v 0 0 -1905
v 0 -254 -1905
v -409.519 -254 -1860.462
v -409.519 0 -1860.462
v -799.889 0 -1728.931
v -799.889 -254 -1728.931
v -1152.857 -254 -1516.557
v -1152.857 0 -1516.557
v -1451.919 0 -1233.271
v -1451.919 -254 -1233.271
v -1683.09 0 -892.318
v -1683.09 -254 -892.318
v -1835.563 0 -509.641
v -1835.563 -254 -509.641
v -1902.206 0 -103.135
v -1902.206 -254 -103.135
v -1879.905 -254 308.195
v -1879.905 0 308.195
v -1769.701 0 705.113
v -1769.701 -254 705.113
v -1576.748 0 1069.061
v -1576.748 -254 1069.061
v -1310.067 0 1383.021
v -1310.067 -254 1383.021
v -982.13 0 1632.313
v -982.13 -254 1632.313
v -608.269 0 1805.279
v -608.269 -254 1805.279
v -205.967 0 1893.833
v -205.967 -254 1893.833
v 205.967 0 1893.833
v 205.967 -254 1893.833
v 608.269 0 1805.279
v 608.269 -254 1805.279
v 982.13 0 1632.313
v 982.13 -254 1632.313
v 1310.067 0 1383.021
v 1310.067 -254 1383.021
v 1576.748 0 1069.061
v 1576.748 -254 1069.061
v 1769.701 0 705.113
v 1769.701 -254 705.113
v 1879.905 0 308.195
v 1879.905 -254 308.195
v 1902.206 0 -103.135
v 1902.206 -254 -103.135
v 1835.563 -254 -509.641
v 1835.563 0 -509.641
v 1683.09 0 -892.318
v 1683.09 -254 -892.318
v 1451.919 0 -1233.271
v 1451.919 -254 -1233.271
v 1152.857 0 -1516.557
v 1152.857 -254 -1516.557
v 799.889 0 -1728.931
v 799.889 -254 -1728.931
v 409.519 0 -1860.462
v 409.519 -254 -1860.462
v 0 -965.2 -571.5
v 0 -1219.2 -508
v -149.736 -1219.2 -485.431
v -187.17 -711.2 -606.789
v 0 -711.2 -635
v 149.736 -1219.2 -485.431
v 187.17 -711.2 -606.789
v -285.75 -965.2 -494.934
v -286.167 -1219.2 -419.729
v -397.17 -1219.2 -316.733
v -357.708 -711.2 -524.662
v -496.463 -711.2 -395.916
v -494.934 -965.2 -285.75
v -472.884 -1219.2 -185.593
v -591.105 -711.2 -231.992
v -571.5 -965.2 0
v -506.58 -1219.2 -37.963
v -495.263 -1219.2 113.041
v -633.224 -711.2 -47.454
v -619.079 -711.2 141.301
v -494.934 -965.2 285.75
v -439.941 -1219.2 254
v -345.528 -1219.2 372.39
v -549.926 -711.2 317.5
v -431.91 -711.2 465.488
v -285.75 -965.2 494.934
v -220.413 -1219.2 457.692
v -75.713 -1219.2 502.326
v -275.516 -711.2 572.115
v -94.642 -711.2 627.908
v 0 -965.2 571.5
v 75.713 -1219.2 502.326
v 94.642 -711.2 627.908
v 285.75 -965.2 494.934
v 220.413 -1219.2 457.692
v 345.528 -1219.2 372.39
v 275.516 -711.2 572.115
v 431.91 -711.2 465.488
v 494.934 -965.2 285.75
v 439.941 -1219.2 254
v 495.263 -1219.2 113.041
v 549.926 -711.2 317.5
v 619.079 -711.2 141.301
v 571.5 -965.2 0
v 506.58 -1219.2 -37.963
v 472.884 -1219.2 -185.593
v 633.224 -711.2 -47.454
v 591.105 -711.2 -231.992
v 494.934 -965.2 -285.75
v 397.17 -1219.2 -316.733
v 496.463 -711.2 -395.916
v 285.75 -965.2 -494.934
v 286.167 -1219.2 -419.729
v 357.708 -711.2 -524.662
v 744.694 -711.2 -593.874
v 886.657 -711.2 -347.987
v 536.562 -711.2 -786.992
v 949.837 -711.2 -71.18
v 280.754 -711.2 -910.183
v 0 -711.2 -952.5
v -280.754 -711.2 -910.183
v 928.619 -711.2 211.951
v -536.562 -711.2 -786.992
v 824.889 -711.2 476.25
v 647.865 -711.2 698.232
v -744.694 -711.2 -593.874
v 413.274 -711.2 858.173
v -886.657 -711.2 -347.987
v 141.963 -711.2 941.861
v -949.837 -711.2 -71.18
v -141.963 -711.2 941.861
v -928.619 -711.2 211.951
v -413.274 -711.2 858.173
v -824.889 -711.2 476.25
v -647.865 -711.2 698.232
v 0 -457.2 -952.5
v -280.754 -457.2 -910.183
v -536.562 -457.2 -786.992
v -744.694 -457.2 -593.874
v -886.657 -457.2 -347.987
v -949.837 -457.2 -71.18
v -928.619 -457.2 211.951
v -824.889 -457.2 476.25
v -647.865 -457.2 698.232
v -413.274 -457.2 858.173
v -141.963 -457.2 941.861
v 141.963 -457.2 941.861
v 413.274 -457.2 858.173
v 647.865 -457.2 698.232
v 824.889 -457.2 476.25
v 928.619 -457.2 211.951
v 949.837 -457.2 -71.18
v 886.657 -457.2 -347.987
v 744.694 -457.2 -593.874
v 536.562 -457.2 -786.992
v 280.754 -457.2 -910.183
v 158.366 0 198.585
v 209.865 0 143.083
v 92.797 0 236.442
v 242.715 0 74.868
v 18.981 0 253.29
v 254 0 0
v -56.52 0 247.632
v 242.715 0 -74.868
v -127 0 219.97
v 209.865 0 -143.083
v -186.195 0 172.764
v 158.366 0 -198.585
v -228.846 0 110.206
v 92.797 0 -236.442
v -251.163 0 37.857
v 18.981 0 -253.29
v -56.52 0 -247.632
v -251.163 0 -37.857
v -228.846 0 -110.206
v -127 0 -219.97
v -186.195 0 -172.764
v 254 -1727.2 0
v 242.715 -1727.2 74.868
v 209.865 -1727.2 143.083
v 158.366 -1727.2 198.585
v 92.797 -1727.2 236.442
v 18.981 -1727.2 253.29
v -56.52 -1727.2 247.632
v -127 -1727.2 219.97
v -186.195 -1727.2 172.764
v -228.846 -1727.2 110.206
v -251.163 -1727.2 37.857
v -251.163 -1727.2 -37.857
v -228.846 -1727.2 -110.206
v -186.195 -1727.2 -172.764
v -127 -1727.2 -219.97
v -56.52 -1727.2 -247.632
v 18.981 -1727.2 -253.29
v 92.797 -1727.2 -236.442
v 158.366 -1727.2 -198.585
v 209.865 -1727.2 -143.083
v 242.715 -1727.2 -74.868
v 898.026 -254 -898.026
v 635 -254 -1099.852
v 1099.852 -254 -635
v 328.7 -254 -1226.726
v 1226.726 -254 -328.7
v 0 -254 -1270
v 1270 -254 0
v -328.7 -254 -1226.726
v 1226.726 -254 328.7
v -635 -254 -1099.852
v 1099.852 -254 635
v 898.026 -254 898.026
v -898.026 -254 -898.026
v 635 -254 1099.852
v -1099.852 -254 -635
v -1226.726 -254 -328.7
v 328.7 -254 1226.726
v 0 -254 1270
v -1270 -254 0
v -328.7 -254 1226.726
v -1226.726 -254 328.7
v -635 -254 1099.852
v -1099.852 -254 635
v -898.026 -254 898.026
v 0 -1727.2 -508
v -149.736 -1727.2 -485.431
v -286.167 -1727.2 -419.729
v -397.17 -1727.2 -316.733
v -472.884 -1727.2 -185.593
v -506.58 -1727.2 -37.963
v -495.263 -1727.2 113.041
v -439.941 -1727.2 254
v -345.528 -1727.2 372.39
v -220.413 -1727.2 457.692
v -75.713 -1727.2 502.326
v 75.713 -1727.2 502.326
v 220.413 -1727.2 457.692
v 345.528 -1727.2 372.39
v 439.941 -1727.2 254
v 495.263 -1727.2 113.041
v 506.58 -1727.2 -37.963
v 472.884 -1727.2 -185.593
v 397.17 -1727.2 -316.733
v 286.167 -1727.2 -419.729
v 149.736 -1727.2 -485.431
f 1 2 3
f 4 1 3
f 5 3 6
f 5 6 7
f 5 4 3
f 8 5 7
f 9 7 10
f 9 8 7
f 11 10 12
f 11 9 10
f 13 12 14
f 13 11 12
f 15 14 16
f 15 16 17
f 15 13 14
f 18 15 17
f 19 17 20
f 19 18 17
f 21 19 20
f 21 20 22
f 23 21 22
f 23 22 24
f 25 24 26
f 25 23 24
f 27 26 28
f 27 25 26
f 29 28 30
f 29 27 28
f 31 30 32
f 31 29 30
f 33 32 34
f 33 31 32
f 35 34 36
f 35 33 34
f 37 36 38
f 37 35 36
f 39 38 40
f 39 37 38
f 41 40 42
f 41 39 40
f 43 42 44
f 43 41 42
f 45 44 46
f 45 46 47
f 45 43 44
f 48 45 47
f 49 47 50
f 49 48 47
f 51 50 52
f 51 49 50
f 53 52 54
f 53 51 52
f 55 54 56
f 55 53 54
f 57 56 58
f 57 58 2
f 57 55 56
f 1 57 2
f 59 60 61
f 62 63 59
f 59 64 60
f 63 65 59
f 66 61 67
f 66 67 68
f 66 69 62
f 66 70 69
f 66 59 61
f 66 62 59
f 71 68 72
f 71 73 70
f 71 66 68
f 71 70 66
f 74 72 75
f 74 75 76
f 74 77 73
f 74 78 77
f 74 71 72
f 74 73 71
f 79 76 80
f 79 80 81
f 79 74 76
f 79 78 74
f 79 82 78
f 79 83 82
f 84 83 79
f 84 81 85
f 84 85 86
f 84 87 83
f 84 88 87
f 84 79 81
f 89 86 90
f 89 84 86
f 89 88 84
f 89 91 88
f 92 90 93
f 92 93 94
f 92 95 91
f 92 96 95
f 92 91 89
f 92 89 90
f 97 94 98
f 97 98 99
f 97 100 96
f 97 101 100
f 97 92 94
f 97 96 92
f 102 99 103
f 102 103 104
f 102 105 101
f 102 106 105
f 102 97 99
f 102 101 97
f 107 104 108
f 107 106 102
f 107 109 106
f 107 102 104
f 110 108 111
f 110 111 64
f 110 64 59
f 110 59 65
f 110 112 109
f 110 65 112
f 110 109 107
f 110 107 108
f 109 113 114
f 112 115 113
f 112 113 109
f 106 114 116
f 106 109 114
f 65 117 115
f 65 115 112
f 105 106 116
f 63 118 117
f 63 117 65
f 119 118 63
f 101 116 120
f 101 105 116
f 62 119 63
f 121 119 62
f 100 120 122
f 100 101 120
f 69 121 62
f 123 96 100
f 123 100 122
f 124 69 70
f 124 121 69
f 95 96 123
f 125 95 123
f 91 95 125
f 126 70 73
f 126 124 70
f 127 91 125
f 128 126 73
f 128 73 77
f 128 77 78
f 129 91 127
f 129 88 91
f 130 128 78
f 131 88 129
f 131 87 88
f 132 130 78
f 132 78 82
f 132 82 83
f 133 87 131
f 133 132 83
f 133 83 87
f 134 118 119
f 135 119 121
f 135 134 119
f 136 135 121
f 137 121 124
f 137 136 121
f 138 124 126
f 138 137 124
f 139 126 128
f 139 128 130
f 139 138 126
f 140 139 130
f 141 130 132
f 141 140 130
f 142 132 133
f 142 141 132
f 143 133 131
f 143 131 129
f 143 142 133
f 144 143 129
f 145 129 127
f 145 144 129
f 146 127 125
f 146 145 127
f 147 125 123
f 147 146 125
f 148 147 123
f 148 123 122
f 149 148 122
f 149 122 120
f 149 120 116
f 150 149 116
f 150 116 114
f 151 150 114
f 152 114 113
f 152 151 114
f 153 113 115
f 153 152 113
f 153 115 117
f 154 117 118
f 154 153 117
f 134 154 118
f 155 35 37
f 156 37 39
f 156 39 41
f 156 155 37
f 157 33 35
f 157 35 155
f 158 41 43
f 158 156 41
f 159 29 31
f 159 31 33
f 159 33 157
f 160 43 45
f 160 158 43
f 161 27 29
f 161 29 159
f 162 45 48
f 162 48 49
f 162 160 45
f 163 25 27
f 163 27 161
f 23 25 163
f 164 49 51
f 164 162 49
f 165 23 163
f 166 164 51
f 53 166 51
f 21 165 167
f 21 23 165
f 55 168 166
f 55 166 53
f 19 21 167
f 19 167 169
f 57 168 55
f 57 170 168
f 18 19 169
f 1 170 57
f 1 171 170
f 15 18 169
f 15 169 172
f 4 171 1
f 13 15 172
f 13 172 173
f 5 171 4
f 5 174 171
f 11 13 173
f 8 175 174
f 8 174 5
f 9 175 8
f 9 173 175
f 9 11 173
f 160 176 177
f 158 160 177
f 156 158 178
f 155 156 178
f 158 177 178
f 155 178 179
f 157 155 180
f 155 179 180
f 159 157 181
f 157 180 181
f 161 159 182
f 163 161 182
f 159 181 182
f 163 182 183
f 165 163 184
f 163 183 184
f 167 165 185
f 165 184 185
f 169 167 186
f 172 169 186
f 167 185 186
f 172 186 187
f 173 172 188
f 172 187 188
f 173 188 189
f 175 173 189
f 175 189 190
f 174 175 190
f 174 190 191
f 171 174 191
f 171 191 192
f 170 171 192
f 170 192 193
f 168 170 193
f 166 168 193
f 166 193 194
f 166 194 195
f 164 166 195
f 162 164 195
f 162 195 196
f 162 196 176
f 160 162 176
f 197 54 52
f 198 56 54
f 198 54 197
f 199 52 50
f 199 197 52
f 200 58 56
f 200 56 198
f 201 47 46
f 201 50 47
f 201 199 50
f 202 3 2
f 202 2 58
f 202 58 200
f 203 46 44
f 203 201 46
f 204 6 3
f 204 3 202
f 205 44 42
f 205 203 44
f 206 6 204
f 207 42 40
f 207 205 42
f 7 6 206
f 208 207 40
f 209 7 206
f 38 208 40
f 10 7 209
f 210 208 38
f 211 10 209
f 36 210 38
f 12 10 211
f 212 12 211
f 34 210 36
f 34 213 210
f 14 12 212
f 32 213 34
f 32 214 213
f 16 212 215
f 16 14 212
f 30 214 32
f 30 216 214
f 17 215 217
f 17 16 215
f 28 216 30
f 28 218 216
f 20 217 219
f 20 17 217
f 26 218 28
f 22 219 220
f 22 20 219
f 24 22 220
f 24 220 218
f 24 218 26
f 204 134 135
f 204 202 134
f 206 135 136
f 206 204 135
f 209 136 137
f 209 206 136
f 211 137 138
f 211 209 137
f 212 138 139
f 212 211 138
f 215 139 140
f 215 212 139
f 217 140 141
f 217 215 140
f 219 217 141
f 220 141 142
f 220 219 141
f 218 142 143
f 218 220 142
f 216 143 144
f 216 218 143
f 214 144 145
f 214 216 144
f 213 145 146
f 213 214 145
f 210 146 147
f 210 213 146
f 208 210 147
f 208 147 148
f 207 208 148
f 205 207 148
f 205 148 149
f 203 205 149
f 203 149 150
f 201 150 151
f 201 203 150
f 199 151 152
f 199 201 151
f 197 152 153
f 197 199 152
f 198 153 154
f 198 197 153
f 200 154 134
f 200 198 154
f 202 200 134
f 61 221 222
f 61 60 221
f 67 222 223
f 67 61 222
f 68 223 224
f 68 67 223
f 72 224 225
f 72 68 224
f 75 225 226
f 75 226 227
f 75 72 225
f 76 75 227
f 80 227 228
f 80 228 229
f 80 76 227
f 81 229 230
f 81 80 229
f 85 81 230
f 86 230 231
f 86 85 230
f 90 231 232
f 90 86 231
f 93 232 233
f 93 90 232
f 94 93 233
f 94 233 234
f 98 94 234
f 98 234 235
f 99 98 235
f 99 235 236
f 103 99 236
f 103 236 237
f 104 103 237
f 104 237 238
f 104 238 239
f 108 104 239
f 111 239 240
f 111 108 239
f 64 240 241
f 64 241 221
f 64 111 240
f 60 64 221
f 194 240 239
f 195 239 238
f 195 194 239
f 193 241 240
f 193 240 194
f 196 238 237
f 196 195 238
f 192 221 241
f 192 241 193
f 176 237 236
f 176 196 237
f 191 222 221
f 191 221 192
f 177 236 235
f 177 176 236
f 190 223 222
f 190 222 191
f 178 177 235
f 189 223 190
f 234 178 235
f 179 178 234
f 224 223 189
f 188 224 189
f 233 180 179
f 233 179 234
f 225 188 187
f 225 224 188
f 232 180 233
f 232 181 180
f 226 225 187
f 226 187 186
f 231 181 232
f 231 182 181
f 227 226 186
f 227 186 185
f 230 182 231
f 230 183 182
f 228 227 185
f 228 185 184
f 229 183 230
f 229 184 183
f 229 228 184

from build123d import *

# Parameters (mm, degrees)
F2_R     = 254
F3_DEPTH = 1727.201


with BuildPart() as f1:
    # F0 (on Right) → F1 (revolve)
    with BuildSketch(Plane.YZ):
        Polygon((0, -1905), (0, 0), (-1727.2, 0), (-1727.2, -508), (-1219.2, -508), (-711.2, -635), (-711.2, -952.5), (-457.2, -952.5), (-254, -1270), (-254, -1905), align=None)
    revolve(axis=Axis((0, -863.6, 0), (0, 1, 0)))

    # F2 (on face) → F3 (cut, through all)
    with BuildSketch(Plane.XZ.offset(1727.2)):
        Circle(F2_R)
    extrude(amount=-F3_DEPTH, mode=Mode.SUBTRACT)


solid = f1.part
